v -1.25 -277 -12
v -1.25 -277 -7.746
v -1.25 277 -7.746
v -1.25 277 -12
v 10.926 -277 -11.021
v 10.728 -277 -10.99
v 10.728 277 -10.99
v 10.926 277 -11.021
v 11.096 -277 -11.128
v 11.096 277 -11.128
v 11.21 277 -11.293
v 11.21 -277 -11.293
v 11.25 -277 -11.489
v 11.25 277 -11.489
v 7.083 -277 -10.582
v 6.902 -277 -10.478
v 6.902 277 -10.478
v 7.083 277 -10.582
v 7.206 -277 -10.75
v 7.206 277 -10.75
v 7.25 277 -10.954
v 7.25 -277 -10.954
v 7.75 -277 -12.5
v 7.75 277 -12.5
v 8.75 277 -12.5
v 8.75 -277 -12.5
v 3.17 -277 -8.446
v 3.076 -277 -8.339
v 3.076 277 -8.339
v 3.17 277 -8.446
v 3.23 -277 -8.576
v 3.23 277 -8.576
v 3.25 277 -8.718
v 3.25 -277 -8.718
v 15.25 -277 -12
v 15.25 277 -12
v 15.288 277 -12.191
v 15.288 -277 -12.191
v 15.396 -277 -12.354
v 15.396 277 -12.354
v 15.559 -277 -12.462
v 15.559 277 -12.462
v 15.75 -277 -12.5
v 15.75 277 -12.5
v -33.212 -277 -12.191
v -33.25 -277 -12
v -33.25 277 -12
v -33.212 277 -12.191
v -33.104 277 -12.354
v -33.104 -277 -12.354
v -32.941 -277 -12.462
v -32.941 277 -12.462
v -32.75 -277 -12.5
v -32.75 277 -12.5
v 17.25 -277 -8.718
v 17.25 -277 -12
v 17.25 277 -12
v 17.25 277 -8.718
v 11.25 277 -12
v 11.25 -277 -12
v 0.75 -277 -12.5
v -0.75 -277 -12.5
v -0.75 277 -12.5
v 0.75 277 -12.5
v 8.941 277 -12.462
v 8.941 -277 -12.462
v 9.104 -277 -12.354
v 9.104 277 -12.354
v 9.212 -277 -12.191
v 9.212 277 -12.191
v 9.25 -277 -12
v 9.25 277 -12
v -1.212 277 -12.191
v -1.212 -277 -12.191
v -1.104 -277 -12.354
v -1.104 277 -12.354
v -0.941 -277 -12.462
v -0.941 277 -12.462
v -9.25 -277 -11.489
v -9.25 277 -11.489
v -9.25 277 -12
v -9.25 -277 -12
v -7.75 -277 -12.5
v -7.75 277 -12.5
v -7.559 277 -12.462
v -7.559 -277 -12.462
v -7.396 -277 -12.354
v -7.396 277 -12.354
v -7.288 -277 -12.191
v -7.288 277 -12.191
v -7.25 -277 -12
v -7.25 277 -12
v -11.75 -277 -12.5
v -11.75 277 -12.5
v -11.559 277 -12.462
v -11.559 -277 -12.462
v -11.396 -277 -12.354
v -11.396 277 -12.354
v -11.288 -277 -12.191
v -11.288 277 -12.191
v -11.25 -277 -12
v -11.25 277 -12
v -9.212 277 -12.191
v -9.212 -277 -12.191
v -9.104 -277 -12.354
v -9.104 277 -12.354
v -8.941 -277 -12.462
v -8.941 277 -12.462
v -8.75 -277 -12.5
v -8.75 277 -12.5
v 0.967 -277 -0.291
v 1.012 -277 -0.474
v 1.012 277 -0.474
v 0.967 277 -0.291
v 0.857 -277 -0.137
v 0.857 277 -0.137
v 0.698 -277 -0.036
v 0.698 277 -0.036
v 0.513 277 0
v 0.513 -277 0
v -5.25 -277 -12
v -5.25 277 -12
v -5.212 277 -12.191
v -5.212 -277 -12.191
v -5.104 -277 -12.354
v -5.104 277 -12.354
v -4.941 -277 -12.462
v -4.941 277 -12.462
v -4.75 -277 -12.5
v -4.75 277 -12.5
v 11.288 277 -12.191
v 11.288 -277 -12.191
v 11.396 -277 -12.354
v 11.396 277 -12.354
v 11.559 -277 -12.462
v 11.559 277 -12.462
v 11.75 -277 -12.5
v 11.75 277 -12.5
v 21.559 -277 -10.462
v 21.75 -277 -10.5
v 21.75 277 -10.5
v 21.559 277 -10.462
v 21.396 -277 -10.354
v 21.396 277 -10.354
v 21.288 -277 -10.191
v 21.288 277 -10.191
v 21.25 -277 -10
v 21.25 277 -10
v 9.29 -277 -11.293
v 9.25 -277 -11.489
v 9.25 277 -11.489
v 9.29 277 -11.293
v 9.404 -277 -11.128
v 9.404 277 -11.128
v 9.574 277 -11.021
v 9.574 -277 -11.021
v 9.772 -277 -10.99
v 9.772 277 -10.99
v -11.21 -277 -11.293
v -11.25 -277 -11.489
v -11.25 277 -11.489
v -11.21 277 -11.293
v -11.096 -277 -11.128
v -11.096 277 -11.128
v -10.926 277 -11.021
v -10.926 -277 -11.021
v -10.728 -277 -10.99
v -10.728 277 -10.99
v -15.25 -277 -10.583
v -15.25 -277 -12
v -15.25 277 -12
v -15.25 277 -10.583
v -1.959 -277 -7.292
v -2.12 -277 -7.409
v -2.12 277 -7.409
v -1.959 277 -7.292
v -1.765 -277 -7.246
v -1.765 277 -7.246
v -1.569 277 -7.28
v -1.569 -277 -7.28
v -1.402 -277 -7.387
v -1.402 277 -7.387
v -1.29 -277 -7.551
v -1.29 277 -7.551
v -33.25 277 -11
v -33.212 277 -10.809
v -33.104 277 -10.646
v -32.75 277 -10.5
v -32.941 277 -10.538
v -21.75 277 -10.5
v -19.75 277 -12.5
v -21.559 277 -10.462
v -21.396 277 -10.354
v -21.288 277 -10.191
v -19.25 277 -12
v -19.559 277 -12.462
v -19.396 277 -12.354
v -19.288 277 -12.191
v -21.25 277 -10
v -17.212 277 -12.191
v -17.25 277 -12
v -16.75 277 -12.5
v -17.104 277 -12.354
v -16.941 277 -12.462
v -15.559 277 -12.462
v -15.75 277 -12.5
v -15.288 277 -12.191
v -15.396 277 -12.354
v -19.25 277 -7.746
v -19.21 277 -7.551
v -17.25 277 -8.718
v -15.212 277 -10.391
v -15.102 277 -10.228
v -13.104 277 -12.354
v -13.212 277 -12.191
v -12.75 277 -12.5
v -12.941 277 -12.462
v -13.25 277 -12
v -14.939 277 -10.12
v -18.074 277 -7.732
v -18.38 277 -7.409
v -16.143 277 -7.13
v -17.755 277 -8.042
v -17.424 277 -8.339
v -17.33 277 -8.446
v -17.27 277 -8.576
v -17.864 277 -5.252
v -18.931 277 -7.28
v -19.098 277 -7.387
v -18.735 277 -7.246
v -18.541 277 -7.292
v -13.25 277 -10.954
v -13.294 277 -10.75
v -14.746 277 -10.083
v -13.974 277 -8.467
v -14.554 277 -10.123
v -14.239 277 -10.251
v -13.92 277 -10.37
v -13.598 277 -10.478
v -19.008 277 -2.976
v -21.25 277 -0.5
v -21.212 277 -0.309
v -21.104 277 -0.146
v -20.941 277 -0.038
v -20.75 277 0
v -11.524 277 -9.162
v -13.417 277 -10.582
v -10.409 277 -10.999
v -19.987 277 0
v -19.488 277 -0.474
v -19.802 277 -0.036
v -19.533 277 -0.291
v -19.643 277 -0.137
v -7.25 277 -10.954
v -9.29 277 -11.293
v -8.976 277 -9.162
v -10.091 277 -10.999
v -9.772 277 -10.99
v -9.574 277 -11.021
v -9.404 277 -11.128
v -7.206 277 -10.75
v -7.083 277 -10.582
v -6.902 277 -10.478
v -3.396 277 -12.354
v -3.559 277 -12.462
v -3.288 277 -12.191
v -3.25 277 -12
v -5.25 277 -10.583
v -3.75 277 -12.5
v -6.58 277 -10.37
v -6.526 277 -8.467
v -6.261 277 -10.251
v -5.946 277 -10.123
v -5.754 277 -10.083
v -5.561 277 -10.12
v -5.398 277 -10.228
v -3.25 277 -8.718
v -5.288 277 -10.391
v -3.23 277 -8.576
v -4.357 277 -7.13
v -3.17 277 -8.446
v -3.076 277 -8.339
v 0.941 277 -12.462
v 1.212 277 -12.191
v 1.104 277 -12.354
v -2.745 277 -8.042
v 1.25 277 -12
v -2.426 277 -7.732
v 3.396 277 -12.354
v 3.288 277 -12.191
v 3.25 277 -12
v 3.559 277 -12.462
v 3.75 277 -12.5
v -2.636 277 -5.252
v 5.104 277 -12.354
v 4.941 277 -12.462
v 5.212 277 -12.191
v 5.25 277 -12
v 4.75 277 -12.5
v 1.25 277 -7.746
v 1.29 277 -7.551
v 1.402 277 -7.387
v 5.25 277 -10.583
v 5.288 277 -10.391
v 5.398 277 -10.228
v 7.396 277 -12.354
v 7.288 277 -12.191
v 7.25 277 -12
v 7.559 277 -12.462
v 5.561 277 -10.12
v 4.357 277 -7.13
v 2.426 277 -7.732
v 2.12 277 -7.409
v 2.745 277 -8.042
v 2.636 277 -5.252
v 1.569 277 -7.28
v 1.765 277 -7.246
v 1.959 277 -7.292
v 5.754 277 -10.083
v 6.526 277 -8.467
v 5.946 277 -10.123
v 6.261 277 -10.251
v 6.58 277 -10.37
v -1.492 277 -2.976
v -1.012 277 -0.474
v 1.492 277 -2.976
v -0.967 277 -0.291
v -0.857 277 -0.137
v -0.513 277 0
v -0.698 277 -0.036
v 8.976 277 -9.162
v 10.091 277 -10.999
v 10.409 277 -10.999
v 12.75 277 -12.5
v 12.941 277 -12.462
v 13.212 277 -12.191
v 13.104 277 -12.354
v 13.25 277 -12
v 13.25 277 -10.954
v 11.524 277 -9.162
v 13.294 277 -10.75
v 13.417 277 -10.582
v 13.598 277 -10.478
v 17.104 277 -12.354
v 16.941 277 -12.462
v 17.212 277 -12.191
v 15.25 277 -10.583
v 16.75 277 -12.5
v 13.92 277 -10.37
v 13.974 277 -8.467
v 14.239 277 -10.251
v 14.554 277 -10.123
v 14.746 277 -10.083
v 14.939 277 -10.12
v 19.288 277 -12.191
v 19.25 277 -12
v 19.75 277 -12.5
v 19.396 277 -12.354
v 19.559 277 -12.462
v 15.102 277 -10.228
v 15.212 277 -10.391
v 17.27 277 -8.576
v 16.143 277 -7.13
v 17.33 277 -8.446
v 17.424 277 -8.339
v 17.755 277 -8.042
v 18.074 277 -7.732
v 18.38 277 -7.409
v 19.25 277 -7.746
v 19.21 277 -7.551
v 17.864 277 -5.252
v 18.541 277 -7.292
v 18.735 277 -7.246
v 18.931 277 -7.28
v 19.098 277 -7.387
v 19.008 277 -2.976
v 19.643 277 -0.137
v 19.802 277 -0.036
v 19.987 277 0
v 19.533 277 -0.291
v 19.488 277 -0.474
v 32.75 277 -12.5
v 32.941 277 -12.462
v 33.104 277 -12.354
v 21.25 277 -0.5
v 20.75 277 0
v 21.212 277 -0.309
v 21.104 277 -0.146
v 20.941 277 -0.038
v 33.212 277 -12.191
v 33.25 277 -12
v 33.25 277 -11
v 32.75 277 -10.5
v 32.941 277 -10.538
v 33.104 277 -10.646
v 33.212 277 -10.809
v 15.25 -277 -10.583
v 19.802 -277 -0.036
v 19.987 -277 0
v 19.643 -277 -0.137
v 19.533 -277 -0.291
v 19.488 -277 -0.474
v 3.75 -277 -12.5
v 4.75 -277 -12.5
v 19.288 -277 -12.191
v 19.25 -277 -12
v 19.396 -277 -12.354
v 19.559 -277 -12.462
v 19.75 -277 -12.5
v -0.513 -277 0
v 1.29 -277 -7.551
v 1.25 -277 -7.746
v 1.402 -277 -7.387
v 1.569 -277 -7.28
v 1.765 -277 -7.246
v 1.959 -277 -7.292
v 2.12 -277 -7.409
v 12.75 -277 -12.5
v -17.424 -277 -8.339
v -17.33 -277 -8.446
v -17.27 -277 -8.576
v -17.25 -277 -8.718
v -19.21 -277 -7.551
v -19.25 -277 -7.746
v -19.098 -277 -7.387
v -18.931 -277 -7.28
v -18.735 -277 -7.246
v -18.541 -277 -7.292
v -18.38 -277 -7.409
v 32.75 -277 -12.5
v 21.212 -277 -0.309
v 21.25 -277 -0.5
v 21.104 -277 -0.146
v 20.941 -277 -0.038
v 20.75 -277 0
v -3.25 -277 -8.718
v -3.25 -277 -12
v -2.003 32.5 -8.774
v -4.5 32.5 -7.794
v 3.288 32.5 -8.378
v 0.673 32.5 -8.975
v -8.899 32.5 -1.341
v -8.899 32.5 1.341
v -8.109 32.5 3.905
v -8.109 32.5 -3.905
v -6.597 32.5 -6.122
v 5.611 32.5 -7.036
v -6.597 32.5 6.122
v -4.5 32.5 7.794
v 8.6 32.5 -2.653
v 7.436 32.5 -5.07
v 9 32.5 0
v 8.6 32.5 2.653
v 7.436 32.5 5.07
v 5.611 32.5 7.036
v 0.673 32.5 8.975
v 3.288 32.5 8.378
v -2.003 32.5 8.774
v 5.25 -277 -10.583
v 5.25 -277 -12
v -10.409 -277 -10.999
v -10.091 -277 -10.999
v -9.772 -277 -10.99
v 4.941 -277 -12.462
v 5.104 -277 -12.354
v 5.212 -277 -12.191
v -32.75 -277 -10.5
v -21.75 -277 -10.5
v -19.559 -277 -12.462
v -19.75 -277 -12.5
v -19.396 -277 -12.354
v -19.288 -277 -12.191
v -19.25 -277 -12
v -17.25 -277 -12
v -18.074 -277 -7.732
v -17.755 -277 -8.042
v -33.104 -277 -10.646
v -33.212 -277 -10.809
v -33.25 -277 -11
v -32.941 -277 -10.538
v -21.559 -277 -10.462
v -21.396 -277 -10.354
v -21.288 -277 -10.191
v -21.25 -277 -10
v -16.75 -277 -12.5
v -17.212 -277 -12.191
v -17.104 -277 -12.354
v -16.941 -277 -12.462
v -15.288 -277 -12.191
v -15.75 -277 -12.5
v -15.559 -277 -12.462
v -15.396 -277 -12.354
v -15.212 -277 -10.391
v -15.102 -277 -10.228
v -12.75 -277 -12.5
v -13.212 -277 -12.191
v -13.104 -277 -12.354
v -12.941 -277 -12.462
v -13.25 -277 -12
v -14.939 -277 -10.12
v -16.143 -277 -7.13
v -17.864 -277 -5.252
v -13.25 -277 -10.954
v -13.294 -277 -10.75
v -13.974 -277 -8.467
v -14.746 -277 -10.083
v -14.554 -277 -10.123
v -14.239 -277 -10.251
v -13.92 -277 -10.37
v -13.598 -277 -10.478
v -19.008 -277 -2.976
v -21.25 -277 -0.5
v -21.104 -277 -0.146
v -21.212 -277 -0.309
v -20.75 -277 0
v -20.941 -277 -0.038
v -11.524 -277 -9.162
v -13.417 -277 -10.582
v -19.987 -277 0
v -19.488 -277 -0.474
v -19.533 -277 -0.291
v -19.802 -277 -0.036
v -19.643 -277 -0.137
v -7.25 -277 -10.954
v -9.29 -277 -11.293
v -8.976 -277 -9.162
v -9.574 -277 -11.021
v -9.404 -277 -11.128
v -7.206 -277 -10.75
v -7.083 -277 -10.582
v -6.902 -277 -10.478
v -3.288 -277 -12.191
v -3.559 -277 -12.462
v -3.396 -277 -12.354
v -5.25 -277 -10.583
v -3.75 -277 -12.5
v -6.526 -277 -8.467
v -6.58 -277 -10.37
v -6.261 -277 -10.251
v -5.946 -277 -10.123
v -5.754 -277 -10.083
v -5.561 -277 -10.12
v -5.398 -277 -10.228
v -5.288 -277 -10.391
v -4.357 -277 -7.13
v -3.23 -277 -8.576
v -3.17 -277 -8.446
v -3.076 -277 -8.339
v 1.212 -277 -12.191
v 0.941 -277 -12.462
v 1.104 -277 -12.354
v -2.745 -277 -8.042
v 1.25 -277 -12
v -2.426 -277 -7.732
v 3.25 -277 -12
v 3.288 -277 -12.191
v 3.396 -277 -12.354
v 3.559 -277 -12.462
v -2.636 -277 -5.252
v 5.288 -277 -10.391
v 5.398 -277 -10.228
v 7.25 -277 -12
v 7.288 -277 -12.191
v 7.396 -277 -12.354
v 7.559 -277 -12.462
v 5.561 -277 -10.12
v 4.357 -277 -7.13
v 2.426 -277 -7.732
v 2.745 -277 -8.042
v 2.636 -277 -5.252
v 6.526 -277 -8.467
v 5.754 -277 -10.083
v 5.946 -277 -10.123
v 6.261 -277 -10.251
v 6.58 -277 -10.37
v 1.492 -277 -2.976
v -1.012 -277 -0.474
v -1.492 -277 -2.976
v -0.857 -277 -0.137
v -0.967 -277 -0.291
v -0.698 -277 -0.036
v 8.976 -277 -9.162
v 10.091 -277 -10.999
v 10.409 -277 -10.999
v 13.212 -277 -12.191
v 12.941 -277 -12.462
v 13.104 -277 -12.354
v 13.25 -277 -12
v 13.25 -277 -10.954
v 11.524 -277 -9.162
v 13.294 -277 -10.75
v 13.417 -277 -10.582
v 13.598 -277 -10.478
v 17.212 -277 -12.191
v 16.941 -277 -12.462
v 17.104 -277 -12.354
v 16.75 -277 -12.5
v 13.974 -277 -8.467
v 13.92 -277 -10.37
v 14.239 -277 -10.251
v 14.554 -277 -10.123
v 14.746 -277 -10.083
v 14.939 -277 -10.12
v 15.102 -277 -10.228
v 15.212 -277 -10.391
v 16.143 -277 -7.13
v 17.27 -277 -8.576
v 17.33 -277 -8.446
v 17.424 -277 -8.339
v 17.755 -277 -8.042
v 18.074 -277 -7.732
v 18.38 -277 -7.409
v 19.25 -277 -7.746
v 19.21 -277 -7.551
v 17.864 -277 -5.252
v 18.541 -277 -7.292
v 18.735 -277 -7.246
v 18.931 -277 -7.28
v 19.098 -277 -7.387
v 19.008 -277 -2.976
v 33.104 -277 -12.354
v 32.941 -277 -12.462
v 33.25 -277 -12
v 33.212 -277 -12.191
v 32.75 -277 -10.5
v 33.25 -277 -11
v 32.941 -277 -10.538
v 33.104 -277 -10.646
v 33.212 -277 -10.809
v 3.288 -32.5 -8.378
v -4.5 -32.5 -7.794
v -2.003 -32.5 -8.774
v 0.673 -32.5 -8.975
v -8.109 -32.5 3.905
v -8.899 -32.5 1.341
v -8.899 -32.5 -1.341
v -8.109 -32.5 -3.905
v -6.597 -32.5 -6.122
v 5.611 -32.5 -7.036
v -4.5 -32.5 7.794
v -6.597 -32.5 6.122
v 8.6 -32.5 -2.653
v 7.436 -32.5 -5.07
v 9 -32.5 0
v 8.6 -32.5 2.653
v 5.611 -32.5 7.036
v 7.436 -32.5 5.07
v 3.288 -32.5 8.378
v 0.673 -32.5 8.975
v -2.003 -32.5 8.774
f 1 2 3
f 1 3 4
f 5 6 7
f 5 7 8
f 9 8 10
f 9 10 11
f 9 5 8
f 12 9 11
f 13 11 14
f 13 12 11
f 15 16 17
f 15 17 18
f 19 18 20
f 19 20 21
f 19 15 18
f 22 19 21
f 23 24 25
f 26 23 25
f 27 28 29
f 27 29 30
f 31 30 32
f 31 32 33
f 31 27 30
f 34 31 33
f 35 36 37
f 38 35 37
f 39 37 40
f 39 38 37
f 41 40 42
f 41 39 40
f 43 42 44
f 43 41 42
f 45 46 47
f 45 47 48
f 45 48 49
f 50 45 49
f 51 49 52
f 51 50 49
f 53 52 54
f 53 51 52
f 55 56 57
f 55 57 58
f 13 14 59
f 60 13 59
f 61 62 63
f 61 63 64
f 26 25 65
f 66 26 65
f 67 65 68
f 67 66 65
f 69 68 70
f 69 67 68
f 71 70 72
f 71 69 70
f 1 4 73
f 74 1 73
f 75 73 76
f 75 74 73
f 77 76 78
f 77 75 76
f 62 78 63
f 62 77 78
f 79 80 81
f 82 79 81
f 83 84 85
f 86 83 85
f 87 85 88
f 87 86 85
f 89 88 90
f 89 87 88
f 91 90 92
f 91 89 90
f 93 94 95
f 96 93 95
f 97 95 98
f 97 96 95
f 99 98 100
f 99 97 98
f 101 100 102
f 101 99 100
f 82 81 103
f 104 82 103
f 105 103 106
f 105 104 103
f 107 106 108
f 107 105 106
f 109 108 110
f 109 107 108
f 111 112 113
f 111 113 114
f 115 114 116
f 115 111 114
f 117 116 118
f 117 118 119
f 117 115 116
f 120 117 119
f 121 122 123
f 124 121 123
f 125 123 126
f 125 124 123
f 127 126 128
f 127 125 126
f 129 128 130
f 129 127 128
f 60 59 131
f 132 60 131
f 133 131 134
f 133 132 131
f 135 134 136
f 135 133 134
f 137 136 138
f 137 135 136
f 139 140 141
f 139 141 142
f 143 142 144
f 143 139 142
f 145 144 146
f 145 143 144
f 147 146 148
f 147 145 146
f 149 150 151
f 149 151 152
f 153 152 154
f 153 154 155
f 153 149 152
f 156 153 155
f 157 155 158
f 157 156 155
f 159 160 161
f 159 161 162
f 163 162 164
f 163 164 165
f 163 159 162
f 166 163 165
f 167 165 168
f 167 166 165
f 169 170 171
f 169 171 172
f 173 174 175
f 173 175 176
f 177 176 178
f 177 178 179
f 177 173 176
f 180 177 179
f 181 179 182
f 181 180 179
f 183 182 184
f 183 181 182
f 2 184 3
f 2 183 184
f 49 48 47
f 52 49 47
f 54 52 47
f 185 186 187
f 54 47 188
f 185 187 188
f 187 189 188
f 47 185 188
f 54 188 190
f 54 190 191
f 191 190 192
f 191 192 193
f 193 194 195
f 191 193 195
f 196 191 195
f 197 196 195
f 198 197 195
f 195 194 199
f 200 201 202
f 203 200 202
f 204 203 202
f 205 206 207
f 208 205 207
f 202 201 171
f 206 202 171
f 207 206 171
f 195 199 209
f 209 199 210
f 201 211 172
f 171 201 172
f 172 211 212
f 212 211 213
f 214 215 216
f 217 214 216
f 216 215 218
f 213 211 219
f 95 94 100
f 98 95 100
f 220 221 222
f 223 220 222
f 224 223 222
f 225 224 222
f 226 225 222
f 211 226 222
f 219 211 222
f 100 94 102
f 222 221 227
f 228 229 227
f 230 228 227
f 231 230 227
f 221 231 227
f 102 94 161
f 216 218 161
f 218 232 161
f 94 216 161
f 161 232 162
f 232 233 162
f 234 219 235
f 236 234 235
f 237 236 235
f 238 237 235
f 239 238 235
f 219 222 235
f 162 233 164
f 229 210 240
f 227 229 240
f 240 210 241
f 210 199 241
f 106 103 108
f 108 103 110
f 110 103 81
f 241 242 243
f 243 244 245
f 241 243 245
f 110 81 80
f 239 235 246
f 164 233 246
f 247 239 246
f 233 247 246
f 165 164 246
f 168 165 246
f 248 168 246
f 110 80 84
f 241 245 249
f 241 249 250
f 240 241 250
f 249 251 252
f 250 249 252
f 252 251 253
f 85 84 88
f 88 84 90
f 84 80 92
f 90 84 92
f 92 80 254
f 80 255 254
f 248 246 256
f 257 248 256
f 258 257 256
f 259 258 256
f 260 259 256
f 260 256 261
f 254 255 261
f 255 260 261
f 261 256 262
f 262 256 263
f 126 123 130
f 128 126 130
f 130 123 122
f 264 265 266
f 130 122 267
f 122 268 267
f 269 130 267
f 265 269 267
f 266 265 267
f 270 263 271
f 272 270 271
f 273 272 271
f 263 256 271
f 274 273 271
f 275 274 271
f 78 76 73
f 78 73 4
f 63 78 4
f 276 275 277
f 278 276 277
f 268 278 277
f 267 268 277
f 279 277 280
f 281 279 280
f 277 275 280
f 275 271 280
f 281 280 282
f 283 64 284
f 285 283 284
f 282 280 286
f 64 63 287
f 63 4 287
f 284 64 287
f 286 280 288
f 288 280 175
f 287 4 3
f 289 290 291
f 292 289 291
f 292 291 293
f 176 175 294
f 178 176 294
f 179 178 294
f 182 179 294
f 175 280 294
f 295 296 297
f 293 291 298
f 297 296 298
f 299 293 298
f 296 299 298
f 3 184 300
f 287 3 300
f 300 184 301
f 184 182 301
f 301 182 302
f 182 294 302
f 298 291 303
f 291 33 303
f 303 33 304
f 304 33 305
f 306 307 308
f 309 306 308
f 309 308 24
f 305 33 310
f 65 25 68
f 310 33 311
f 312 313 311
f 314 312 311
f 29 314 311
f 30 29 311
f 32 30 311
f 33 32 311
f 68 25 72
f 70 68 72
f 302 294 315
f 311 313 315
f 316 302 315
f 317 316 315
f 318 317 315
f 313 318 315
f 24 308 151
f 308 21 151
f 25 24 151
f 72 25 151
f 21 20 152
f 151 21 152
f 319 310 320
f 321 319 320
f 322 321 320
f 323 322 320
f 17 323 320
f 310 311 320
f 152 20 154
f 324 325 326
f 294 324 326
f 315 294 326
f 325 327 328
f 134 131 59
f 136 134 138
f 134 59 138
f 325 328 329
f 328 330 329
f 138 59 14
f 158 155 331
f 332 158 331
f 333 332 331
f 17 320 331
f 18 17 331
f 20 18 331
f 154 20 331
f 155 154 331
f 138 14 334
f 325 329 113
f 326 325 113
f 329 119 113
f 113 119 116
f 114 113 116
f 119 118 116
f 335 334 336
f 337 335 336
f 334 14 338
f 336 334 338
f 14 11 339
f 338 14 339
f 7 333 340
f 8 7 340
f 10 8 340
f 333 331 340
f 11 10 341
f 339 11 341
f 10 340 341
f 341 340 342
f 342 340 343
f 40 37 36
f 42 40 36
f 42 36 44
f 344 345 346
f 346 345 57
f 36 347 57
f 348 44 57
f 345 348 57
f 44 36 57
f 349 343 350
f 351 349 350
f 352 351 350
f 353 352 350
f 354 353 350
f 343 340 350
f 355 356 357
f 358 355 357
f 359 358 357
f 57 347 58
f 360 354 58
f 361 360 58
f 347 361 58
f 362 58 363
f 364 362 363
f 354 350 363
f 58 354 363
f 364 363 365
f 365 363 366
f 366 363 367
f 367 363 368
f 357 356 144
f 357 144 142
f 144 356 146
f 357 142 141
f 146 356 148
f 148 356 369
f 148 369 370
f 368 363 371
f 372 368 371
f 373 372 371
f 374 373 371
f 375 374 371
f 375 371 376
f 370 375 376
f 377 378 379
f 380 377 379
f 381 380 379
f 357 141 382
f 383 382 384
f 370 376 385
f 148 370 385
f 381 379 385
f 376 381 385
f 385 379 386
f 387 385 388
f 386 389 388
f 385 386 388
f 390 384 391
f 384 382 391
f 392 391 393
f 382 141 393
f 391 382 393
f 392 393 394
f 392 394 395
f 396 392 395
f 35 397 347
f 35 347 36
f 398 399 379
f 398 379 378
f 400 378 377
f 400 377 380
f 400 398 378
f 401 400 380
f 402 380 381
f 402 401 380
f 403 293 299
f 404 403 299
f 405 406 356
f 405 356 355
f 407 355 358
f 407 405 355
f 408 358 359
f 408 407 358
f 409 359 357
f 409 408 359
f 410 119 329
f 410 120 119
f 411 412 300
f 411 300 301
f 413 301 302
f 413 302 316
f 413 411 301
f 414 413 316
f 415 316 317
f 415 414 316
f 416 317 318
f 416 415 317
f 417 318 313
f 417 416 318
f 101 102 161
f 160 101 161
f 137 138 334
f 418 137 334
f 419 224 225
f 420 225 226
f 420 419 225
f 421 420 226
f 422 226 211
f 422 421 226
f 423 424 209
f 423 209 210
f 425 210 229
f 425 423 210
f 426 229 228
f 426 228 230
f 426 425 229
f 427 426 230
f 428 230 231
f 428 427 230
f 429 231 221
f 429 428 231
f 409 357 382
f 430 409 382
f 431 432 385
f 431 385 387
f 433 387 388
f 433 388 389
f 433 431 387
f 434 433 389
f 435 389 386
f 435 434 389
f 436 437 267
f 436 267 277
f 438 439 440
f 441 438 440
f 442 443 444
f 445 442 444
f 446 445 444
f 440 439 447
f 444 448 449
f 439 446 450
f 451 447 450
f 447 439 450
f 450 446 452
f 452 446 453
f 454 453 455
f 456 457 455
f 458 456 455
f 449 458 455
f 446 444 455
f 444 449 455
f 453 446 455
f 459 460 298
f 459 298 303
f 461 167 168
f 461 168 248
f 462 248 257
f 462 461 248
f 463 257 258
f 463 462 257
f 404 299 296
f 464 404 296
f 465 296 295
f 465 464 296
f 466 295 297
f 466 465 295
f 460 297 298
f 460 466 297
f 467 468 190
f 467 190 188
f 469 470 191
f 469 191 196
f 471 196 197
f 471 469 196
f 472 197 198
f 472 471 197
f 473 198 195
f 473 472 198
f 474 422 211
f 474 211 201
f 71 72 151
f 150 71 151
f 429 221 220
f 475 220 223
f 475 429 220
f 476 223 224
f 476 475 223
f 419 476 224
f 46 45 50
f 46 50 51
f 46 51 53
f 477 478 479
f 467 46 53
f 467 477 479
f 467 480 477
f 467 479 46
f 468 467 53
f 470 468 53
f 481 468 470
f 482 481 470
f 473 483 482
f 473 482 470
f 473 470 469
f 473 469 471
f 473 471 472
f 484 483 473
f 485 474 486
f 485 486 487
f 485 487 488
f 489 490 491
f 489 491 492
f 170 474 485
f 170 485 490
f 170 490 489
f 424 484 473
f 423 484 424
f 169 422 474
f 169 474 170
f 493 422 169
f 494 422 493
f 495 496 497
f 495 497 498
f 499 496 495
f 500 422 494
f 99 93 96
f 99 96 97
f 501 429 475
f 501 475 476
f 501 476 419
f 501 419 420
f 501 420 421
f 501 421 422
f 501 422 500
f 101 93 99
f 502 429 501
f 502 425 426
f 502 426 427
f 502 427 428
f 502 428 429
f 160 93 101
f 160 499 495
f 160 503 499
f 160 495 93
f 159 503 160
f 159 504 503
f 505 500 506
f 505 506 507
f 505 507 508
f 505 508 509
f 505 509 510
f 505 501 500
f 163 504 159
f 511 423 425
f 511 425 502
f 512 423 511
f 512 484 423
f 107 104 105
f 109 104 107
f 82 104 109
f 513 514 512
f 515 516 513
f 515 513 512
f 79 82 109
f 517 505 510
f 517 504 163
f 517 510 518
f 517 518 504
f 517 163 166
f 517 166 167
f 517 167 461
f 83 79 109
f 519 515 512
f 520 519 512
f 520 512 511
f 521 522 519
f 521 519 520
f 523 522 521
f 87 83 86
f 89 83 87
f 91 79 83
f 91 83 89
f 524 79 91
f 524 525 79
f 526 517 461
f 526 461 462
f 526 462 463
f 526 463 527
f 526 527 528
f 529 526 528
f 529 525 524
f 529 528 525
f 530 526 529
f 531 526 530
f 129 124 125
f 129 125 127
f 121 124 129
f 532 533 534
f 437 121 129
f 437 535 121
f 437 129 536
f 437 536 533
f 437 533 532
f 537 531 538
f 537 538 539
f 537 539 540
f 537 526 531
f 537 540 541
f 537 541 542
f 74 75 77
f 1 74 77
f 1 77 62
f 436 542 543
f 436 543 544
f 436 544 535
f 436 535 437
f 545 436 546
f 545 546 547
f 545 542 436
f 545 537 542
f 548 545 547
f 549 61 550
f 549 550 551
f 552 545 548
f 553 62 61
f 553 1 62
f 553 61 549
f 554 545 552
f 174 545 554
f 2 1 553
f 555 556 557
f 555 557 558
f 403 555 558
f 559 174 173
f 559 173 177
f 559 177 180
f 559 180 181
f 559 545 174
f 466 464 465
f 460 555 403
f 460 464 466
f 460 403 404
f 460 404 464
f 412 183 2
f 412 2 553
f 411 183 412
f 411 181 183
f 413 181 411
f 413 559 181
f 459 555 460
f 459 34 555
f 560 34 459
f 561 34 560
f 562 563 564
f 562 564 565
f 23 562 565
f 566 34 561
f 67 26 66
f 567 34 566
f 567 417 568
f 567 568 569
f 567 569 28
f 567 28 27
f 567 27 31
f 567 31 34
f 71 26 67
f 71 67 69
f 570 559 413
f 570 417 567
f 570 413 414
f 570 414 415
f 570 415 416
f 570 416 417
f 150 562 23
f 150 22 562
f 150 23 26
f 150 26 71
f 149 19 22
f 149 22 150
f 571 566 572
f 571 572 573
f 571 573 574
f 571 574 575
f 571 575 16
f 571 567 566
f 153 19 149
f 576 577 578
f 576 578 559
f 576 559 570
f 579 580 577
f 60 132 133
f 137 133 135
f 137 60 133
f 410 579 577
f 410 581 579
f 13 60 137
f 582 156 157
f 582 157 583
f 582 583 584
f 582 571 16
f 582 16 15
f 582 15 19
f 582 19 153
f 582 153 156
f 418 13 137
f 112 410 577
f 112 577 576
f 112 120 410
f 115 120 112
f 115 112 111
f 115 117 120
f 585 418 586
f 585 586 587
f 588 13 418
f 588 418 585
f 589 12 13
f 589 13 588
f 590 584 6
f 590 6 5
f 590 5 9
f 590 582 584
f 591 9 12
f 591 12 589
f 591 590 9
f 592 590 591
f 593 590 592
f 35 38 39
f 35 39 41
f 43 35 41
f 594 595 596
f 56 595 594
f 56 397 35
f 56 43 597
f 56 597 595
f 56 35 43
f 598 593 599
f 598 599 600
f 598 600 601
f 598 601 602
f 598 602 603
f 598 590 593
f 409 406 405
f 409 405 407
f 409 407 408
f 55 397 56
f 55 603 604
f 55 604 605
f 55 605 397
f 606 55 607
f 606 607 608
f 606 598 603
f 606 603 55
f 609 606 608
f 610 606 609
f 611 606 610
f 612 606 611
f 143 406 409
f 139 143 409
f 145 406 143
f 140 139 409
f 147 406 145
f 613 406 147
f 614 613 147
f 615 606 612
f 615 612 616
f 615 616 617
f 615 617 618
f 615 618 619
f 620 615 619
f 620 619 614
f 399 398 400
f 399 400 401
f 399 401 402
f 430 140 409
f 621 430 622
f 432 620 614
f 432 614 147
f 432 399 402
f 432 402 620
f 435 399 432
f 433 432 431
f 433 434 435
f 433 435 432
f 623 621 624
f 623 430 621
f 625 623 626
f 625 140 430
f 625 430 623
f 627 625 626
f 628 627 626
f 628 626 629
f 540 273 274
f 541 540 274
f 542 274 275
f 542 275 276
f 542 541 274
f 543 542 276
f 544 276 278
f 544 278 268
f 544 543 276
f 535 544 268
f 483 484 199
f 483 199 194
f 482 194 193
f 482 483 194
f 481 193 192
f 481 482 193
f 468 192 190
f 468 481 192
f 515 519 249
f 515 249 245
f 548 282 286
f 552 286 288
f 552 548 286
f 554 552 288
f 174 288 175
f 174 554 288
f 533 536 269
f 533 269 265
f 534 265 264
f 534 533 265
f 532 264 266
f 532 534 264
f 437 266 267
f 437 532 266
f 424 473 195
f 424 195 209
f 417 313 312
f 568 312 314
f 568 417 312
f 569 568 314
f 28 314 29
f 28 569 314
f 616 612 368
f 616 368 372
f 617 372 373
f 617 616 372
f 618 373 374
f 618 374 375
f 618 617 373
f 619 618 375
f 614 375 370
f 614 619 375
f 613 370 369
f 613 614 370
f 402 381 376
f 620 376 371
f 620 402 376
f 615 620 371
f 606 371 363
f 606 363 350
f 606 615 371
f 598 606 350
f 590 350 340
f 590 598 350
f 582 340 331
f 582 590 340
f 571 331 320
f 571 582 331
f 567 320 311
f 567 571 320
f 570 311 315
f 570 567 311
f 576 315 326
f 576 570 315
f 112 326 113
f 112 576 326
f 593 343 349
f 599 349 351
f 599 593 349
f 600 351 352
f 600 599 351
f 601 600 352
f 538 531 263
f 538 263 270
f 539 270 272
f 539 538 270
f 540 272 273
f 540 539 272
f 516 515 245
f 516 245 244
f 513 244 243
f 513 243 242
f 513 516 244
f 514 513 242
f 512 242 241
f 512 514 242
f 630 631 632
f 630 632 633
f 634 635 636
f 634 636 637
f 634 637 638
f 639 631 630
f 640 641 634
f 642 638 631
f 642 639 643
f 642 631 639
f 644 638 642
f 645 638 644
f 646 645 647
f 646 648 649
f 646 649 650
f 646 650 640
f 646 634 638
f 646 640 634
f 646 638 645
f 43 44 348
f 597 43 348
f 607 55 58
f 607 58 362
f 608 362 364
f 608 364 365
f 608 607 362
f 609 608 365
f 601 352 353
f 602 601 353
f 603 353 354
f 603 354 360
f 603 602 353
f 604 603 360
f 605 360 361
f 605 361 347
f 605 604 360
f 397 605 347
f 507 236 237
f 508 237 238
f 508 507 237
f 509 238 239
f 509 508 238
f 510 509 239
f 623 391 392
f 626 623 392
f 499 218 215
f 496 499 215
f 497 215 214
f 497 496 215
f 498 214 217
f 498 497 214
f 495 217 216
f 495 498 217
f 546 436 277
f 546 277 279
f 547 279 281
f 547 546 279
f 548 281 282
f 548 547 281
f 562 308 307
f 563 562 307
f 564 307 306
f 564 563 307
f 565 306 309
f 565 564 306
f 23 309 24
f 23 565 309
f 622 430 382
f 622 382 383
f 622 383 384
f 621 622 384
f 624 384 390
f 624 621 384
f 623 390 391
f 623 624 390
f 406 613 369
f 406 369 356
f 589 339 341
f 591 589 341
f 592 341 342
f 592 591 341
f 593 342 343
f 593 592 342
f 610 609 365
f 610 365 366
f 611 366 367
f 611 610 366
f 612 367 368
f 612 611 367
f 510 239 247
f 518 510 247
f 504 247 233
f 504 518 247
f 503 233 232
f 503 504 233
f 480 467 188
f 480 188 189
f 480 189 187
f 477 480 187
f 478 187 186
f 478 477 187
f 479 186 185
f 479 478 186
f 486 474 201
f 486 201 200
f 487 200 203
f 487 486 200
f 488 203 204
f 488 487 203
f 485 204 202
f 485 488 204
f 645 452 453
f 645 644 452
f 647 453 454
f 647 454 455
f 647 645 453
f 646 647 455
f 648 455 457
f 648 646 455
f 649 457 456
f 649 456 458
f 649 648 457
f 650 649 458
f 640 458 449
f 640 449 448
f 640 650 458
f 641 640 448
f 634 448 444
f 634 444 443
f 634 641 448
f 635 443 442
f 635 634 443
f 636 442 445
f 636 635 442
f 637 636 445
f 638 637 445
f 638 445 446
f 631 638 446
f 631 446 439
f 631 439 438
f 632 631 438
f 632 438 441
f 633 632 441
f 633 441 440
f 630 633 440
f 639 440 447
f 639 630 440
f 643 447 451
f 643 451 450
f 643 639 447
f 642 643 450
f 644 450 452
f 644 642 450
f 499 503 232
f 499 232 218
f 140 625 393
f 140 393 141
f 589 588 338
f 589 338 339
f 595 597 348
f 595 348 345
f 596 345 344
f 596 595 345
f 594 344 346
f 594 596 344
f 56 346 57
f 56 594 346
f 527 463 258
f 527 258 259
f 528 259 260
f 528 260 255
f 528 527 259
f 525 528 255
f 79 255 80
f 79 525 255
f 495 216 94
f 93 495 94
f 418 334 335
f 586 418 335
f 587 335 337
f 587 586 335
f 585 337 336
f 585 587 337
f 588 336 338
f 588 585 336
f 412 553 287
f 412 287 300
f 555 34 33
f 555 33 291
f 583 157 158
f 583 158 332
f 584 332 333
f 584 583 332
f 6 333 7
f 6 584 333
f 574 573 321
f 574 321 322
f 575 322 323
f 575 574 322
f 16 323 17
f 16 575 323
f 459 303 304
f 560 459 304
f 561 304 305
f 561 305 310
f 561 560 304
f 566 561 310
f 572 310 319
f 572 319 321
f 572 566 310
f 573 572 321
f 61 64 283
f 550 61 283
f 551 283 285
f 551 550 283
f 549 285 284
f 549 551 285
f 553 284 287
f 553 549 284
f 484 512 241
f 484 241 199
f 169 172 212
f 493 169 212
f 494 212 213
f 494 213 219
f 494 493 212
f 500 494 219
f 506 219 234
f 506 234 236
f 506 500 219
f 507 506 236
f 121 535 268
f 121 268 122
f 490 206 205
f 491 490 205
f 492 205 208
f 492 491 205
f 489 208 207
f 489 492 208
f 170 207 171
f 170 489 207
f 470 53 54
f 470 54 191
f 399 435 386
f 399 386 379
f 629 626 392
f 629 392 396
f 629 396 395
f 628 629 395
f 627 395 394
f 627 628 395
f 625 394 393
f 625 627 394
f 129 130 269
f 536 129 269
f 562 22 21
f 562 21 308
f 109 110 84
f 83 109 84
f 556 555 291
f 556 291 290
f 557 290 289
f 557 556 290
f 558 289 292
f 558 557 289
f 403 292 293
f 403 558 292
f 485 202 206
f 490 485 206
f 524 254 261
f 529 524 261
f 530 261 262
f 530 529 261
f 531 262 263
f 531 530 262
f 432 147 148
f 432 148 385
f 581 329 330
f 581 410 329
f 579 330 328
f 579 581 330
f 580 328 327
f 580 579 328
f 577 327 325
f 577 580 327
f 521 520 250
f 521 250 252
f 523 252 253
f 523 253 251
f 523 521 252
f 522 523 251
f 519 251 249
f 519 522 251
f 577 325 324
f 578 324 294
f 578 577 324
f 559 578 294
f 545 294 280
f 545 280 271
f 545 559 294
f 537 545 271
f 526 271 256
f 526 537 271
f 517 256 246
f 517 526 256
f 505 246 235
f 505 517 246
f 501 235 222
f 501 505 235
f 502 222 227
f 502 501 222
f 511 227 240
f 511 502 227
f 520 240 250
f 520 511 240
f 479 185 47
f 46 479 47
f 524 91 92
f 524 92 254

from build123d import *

# Parameters (mm, degrees)
F1_DEPTH = 277
F2_R     = 9
F3_DEPTH = 32.5


with BuildPart() as f1:
    # F0 (on Front) → F1 (new body, symmetric)
    with BuildSketch(Plane.XZ):
        with BuildLine():
            ThreePointArc((-1.0121710579, -0.4743589744), (-10.25, -9.25), (-19.4878289421, -0.4743589744))
            ThreePointArc((-19.4878289421, -0.4743589744), (-19.6428024312, -0.137494474), (-19.9871710471, 0))
            Line((-19.9871710471, 0), (-20.75, 0))
            ThreePointArc((-20.75, 0), (-21.1035533906, -0.1464466094), (-21.25, -0.5))
            Line((-21.25, -0.5), (-21.25, -10))
            ThreePointArc((-21.25, -10), (-21.3964466094, -10.3535533906), (-21.75, -10.5))
            Line((-21.75, -10.5), (-32.75, -10.5))
            ThreePointArc((-32.75, -10.5), (-33.1035533906, -10.6464466094), (-33.25, -11))
            Line((-33.25, -11), (-33.25, -12))
            ThreePointArc((-33.25, -12), (-33.1035533906, -12.3535533906), (-32.75, -12.5))
            Line((-32.75, -12.5), (-21.25, -12.5))
            Line((-21.25, -12.5), (-19.75, -12.5))
            ThreePointArc((-19.75, -12.5), (-19.3964466094, -12.3535533906), (-19.25, -12))
            Line((-19.25, -12), (-19.25, -7.7459666924))
            ThreePointArc((-19.25, -7.7459666924), (-18.9305787796, -7.2797142883), (-18.3804347826, -7.4091855319))
            ThreePointArc((-18.3804347826, -7.4091855319), (-17.9162764269, -7.8884856434), (-17.4239130435, -8.3387631963))
            ThreePointArc((-17.4239130435, -8.3387631963), (-17.2955533704, -8.509283473), (-17.25, -8.7177978871))
            Line((-17.25, -8.7177978871), (-17.25, -12))
            ThreePointArc((-17.25, -12), (-17.1035533906, -12.3535533906), (-16.75, -12.5))
            Line((-16.75, -12.5), (-15.75, -12.5))
            ThreePointArc((-15.75, -12.5), (-15.3964466094, -12.3535533906), (-15.25, -12))
            Line((-15.25, -12), (-15.25, -10.5830052443))
            ThreePointArc((-15.25, -10.5830052443), (-15.0258386422, -10.1659764161), (-14.5543478261, -10.1228745815))
            ThreePointArc((-14.5543478261, -10.1228745815), (-14.080208901, -10.3116196485), (-13.597826087, -10.4781706653))
            ThreePointArc((-13.597826087, -10.4781706653), (-13.3462135735, -10.6595672378), (-13.25, -10.9544511501))
            Line((-13.25, -10.9544511501), (-13.25, -12))
            ThreePointArc((-13.25, -12), (-13.1035533906, -12.3535533906), (-12.75, -12.5))
            Line((-12.75, -12.5), (-11.75, -12.5))
            ThreePointArc((-11.75, -12.5), (-11.3964466094, -12.3535533906), (-11.25, -12))
            Line((-11.25, -12), (-11.25, -11.4891252931))
            ThreePointArc((-11.25, -11.4891252931), (-11.0957820374, -11.1279677338), (-10.7282608696, -10.9895981064))
            ThreePointArc((-10.7282608696, -10.9895981064), (-10.25, -11), (-9.7717391304, -10.9895981064))
            ThreePointArc((-9.7717391304, -10.9895981064), (-9.4042179626, -11.1279677338), (-9.25, -11.4891252931))
            Line((-9.25, -11.4891252931), (-9.25, -12))
            ThreePointArc((-9.25, -12), (-9.1035533906, -12.3535533906), (-8.75, -12.5))
            Line((-8.75, -12.5), (-7.75, -12.5))
            ThreePointArc((-7.75, -12.5), (-7.3964466094, -12.3535533906), (-7.25, -12))
            Line((-7.25, -12), (-7.25, -10.9544511501))
            ThreePointArc((-7.25, -10.9544511501), (-7.1537864265, -10.6595672378), (-6.902173913, -10.4781706653))
            ThreePointArc((-6.902173913, -10.4781706653), (-6.419791099, -10.3116196485), (-5.9456521739, -10.1228745815))
            ThreePointArc((-5.9456521739, -10.1228745815), (-5.4741613578, -10.1659764161), (-5.25, -10.5830052443))
            Line((-5.25, -10.5830052443), (-5.25, -12))
            ThreePointArc((-5.25, -12), (-5.1035533906, -12.3535533906), (-4.75, -12.5))
            Line((-4.75, -12.5), (-3.75, -12.5))
            ThreePointArc((-3.75, -12.5), (-3.3964466094, -12.3535533906), (-3.25, -12))
            Line((-3.25, -12), (-3.25, -8.7177978871))
            ThreePointArc((-3.25, -8.7177978871), (-3.2044466296, -8.509283473), (-3.0760869565, -8.3387631963))
            ThreePointArc((-3.0760869565, -8.3387631963), (-2.5837235731, -7.8884856434), (-2.1195652174, -7.4091855319))
            ThreePointArc((-2.1195652174, -7.4091855319), (-1.5694212204, -7.2797142883), (-1.25, -7.7459666924))
            Line((-1.25, -7.7459666924), (-1.25, -12))
            ThreePointArc((-1.25, -12), (-1.1035533906, -12.3535533906), (-0.75, -12.5))
            Line((-0.75, -12.5), (0, -12.5))
            Line((0, -12.5), (0.75, -12.5))
            ThreePointArc((0.75, -12.5), (1.1035533906, -12.3535533906), (1.25, -12))
            Line((1.25, -12), (1.25, -7.7459666924))
            ThreePointArc((1.25, -7.7459666924), (1.5694212204, -7.2797142883), (2.1195652174, -7.4091855319))
            ThreePointArc((2.1195652174, -7.4091855319), (2.5837235731, -7.8884856434), (3.0760869565, -8.3387631963))
            ThreePointArc((3.0760869565, -8.3387631963), (3.2044466296, -8.509283473), (3.25, -8.7177978871))
            Line((3.25, -8.7177978871), (3.25, -12))
            ThreePointArc((3.25, -12), (3.3964466094, -12.3535533906), (3.75, -12.5))
            Line((3.75, -12.5), (4.75, -12.5))
            ThreePointArc((4.75, -12.5), (5.1035533906, -12.3535533906), (5.25, -12))
            Line((5.25, -12), (5.25, -10.5830052443))
            ThreePointArc((5.25, -10.5830052443), (5.4741613578, -10.1659764161), (5.9456521739, -10.1228745815))
            ThreePointArc((5.9456521739, -10.1228745815), (6.419791099, -10.3116196485), (6.902173913, -10.4781706653))
            ThreePointArc((6.902173913, -10.4781706653), (7.1537864265, -10.6595672378), (7.25, -10.9544511501))
            Line((7.25, -10.9544511501), (7.25, -12))
            ThreePointArc((7.25, -12), (7.3964466094, -12.3535533906), (7.75, -12.5))
            Line((7.75, -12.5), (8.75, -12.5))
            ThreePointArc((8.75, -12.5), (9.1035533906, -12.3535533906), (9.25, -12))
            Line((9.25, -12), (9.25, -11.4891252931))
            ThreePointArc((9.25, -11.4891252931), (9.4042179626, -11.1279677338), (9.7717391304, -10.9895981064))
            ThreePointArc((9.7717391304, -10.9895981064), (10.25, -11), (10.7282608696, -10.9895981064))
            ThreePointArc((10.7282608696, -10.9895981064), (11.0957820374, -11.1279677338), (11.25, -11.4891252931))
            Line((11.25, -11.4891252931), (11.25, -12))
            ThreePointArc((11.25, -12), (11.3964466094, -12.3535533906), (11.75, -12.5))
            Line((11.75, -12.5), (12.75, -12.5))
            ThreePointArc((12.75, -12.5), (13.1035533906, -12.3535533906), (13.25, -12))
            Line((13.25, -12), (13.25, -10.9544511501))
            ThreePointArc((13.25, -10.9544511501), (13.3462135735, -10.6595672378), (13.597826087, -10.4781706653))
            ThreePointArc((13.597826087, -10.4781706653), (14.080208901, -10.3116196485), (14.5543478261, -10.1228745815))
            ThreePointArc((14.5543478261, -10.1228745815), (15.0258386422, -10.1659764161), (15.25, -10.5830052443))
            Line((15.25, -10.5830052443), (15.25, -12))
            ThreePointArc((15.25, -12), (15.3964466094, -12.3535533906), (15.75, -12.5))
            Line((15.75, -12.5), (16.75, -12.5))
            ThreePointArc((16.75, -12.5), (17.1035533906, -12.3535533906), (17.25, -12))
            Line((17.25, -12), (17.25, -8.7177978871))
            ThreePointArc((17.25, -8.7177978871), (17.2955533704, -8.509283473), (17.4239130435, -8.3387631963))
            ThreePointArc((17.4239130435, -8.3387631963), (17.9162764269, -7.8884856434), (18.3804347826, -7.4091855319))
            ThreePointArc((18.3804347826, -7.4091855319), (18.9305787796, -7.2797142883), (19.25, -7.7459666924))
            Line((19.25, -7.7459666924), (19.25, -12))
            ThreePointArc((19.25, -12), (19.3964466094, -12.3535533906), (19.75, -12.5))
            Line((19.75, -12.5), (21.25, -12.5))
            Line((21.25, -12.5), (32.75, -12.5))
            ThreePointArc((32.75, -12.5), (33.1035533906, -12.3535533906), (33.25, -12))
            Line((33.25, -12), (33.25, -11))
            ThreePointArc((33.25, -11), (33.1035533906, -10.6464466094), (32.75, -10.5))
            Line((32.75, -10.5), (21.75, -10.5))
            ThreePointArc((21.75, -10.5), (21.3964466094, -10.3535533906), (21.25, -10))
            Line((21.25, -10), (21.25, -0.5))
            ThreePointArc((21.25, -0.5), (21.1035533906, -0.1464466094), (20.75, 0))
            Line((20.75, 0), (19.9871710471, 0))
            ThreePointArc((19.9871710471, 0), (19.6428024312, -0.137494474), (19.4878289421, -0.4743589744))
            ThreePointArc((19.4878289421, -0.4743589744), (10.25, -9.25), (1.0121710579, -0.4743589744))
            ThreePointArc((1.0121710579, -0.4743589744), (0.8571975688, -0.137494474), (0.5128289529, 0))
            Line((0.5128289529, 0), (0, 0))
            Line((0, 0), (-0.5128289529, 0))
            ThreePointArc((-0.5128289529, 0), (-0.8571975688, -0.137494474), (-1.0121710579, -0.4743589744))
        make_face()
    extrude(amount=F1_DEPTH, both=True)


with BuildPart() as f3:
    # F2 (on Front) → F3 (new body, symmetric)
    with BuildSketch(Plane.XZ):
        Circle(F2_R)
    extrude(amount=F3_DEPTH, both=True)


solid = Compound([f1.part, f3.part])
